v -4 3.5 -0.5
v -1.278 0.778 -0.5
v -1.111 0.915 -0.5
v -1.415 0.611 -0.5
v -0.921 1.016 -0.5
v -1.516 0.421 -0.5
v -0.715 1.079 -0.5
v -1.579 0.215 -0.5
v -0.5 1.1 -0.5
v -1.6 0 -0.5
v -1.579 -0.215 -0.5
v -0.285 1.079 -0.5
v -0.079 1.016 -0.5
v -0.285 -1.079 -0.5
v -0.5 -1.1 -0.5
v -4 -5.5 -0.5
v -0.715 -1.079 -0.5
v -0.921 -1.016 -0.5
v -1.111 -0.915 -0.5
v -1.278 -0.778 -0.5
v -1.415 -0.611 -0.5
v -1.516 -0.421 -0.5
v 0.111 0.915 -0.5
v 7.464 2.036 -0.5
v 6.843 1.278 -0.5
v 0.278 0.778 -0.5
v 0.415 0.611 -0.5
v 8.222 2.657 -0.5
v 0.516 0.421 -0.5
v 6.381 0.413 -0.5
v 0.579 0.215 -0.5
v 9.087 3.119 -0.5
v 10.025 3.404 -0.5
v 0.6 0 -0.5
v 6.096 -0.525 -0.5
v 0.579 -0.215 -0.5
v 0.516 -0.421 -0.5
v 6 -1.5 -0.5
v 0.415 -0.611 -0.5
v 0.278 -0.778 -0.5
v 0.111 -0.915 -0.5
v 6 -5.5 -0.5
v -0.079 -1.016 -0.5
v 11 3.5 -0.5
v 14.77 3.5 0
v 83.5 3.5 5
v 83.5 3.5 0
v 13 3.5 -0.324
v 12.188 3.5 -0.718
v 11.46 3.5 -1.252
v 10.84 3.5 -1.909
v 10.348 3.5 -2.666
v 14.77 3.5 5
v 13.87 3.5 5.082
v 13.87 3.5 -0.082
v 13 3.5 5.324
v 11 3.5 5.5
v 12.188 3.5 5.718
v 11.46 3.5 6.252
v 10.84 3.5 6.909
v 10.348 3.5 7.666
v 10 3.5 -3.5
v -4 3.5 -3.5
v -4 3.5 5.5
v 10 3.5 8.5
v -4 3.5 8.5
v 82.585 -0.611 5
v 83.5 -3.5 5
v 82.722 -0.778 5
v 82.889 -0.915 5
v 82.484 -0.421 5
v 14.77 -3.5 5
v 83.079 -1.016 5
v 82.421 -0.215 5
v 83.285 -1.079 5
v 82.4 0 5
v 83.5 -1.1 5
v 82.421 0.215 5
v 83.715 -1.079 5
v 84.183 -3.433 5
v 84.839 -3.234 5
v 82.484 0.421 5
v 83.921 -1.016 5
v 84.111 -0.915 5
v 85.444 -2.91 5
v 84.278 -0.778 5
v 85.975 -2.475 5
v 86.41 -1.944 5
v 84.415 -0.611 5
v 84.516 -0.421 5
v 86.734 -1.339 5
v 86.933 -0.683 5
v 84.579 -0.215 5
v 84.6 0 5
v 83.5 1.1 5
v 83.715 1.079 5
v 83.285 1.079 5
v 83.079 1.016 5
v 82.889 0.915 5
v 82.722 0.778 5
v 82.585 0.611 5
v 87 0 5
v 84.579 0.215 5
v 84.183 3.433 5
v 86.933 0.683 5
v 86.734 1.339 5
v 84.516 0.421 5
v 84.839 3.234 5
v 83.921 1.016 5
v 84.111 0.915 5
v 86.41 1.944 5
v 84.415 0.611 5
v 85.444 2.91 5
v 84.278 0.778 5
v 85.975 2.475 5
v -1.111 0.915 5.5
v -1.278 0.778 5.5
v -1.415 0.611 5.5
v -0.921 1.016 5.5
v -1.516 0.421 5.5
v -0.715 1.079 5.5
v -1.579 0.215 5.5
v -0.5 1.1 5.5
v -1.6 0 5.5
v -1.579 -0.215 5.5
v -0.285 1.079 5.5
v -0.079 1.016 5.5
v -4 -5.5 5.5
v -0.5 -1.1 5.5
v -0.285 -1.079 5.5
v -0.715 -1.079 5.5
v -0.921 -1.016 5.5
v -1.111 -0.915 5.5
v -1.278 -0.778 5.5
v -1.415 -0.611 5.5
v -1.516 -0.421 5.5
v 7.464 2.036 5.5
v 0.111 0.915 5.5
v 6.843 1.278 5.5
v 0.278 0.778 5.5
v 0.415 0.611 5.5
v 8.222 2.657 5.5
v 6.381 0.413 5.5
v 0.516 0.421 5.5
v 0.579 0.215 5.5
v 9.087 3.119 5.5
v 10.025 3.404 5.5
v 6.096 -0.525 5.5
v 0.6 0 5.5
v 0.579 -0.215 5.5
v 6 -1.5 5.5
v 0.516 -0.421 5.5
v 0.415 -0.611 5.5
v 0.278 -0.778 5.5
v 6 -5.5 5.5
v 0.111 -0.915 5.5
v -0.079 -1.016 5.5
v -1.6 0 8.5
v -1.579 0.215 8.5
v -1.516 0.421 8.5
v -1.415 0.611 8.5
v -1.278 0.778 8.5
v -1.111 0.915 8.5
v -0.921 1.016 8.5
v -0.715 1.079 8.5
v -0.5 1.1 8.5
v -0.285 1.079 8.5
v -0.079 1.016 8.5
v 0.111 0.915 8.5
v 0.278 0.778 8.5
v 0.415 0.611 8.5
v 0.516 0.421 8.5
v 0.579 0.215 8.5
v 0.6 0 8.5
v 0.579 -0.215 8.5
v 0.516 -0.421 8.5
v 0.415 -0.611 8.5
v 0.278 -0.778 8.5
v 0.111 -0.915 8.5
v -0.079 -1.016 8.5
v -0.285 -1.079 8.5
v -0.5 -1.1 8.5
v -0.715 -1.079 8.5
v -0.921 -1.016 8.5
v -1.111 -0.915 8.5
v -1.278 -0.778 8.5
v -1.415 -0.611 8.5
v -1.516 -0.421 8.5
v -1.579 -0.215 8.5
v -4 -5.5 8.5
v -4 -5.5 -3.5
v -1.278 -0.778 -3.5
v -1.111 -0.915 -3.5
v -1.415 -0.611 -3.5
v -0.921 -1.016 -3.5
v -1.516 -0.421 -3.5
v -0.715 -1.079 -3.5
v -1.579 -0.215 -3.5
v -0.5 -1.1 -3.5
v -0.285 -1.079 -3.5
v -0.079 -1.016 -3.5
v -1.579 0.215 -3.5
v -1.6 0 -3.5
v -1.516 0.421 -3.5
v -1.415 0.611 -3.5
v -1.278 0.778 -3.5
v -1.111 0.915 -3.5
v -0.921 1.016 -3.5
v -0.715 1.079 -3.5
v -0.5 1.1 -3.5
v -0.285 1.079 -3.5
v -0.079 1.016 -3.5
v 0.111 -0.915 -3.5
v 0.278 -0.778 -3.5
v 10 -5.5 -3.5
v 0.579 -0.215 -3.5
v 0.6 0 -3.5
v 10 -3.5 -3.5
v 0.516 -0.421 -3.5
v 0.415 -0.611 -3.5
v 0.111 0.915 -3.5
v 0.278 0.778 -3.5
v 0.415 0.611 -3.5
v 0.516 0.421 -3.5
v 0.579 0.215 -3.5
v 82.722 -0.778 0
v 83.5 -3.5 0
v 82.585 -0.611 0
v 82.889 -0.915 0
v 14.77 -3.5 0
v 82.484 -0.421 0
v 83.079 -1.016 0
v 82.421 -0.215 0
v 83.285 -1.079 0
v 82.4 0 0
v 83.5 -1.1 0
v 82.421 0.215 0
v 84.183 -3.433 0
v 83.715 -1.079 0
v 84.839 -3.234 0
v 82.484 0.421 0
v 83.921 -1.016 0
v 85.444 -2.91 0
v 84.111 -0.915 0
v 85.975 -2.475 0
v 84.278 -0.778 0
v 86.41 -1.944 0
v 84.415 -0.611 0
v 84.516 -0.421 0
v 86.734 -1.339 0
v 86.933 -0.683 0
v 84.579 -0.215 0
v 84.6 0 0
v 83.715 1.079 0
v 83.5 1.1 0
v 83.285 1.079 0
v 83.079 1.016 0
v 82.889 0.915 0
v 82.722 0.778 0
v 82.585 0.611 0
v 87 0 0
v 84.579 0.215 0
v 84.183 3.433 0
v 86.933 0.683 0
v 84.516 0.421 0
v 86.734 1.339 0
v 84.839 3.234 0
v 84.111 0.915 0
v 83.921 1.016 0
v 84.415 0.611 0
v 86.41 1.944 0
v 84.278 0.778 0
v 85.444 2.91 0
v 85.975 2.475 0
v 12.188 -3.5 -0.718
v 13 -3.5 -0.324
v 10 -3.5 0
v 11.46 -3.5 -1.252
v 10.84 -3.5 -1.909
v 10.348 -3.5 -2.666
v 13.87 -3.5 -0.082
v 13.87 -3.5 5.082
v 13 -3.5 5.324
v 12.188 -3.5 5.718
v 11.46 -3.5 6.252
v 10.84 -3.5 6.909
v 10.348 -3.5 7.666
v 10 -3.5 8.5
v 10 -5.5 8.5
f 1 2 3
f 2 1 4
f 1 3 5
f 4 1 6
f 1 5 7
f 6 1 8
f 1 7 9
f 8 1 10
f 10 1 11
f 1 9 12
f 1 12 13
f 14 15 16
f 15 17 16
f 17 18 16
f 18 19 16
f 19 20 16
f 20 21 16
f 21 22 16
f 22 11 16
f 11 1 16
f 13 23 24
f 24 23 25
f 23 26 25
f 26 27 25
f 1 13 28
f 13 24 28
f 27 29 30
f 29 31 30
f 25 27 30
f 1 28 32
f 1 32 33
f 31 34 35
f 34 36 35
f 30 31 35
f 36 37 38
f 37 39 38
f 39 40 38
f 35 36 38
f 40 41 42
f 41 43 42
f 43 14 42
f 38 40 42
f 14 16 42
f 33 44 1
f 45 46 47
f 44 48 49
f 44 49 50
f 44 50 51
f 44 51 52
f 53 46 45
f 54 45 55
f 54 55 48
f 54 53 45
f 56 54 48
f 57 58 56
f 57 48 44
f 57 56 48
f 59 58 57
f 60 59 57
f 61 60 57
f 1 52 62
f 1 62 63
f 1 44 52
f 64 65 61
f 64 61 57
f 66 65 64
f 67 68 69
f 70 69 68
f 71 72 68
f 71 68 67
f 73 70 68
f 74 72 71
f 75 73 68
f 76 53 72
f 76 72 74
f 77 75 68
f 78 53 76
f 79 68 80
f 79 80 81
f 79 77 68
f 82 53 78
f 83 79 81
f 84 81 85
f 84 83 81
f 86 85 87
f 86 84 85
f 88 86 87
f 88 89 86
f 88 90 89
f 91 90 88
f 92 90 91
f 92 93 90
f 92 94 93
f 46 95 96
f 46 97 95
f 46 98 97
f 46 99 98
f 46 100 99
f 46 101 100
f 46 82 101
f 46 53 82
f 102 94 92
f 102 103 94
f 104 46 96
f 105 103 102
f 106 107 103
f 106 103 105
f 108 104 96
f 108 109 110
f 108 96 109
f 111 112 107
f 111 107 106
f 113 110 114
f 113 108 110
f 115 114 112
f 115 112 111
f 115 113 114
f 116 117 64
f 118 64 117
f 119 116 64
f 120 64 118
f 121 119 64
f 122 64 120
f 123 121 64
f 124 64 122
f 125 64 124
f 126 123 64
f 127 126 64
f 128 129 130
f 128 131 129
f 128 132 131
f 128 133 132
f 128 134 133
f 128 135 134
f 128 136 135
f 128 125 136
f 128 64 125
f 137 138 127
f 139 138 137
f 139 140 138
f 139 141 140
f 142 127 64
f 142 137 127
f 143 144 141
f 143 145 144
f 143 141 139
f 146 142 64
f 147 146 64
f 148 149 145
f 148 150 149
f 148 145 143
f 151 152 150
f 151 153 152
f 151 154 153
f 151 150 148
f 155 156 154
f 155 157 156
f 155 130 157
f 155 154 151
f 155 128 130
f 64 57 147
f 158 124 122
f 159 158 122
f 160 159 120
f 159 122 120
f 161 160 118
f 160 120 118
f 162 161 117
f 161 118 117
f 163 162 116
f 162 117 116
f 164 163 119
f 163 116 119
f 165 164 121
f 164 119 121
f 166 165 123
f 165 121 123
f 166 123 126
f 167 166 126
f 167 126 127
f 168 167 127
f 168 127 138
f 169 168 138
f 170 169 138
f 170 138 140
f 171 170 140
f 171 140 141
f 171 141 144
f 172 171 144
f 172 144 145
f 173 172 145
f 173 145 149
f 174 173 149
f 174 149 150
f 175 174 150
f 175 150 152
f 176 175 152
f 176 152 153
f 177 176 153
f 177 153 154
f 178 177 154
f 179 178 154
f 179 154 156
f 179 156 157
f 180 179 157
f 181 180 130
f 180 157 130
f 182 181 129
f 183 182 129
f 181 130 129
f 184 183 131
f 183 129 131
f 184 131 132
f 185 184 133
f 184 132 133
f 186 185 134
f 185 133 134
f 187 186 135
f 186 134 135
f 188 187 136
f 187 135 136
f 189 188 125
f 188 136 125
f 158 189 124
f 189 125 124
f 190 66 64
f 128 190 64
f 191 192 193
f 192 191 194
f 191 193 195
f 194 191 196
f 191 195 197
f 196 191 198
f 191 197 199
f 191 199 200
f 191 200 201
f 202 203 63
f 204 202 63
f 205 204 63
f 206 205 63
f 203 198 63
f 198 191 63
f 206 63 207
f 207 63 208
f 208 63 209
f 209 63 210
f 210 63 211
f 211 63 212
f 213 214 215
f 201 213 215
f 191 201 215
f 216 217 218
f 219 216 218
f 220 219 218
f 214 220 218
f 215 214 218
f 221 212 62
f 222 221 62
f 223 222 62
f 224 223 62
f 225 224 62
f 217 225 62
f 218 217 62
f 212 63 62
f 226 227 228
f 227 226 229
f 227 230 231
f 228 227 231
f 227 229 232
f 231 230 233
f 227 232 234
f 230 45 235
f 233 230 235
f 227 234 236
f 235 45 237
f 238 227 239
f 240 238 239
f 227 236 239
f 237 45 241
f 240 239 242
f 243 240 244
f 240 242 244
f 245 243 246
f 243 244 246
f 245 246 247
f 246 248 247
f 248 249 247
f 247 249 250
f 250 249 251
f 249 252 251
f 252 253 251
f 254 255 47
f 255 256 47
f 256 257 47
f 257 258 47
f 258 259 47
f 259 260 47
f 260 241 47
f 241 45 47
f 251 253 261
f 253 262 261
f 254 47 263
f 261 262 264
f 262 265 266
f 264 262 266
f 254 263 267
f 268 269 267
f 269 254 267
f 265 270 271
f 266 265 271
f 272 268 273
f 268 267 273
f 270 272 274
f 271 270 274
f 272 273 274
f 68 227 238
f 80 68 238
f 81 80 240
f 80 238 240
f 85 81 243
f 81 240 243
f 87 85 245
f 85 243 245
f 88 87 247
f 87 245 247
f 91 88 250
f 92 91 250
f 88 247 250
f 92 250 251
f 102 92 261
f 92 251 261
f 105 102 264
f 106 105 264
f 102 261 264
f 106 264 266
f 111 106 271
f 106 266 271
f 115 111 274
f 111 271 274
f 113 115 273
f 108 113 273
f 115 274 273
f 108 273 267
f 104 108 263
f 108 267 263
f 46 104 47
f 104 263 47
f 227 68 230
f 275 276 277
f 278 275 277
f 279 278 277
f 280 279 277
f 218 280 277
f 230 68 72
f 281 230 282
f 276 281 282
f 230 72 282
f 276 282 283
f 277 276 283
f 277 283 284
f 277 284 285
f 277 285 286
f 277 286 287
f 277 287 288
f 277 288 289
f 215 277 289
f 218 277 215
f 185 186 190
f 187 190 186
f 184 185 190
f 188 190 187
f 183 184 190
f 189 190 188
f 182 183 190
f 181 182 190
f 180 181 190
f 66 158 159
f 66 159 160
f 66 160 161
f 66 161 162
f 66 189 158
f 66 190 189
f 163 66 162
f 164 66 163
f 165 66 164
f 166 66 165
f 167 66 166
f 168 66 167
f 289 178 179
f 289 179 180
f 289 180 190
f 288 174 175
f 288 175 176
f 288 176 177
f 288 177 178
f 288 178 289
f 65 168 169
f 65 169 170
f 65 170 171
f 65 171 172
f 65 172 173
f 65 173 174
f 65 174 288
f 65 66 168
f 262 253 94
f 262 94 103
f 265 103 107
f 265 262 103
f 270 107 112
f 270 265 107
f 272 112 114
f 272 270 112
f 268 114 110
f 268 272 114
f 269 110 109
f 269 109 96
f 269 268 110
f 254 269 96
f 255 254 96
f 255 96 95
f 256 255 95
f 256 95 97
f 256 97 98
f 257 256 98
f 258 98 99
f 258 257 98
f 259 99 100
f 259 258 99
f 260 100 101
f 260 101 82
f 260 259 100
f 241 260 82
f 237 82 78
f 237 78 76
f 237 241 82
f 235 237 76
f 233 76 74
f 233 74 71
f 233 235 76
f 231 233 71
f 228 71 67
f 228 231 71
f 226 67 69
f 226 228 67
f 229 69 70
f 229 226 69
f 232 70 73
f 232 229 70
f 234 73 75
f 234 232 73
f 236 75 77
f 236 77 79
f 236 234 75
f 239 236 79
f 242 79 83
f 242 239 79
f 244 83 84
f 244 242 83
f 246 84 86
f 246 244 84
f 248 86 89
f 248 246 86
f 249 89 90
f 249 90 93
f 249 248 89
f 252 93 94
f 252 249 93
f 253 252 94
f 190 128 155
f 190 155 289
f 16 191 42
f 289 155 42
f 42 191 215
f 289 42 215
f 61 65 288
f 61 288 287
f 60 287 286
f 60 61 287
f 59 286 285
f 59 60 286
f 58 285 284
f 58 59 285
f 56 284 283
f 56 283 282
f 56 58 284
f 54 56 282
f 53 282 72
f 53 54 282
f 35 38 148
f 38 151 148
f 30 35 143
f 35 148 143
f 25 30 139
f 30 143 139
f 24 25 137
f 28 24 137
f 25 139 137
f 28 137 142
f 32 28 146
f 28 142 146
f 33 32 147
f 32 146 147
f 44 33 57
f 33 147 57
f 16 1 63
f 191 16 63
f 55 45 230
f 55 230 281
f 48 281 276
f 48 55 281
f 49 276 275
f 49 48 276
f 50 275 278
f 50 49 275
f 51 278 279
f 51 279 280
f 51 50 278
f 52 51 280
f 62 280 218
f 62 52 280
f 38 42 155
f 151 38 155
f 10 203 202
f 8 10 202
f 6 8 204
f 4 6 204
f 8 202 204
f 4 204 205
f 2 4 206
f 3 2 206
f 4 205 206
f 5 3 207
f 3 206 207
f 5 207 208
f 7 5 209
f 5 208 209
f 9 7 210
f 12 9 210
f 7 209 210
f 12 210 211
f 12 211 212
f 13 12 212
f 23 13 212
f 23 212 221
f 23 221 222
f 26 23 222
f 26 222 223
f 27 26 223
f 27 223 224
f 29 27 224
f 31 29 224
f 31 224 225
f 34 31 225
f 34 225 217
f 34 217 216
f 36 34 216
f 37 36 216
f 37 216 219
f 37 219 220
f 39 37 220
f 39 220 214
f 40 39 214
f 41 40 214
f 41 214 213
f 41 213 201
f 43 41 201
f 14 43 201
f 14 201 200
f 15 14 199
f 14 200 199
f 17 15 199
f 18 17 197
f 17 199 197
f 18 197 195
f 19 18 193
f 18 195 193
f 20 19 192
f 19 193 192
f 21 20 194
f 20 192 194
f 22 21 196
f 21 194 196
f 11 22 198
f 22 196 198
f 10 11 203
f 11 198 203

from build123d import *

# Parameters (mm, degrees)
SKETCH1_R           = 1.1
BOSS_EXTRUDE1_DEPTH = 5
SKETCH4_W           = 14
SKETCH4_H           = 12
BOSS_EXTRUDE3_DEPTH = 9
SKETCH5_W           = 10
SKETCH5_H           = 6
CUT_EXTRUDE2_DEPTH  = 9
CUT_EXTRUDE3_START  = 5
SKETCH7_R           = 1.1
CUT_EXTRUDE3_DEPTH  = 15
FILLET1_R           = 5
FILLET2_R           = 5


with BuildPart() as part:
    # Sketch1 → Boss-Extrude1 (new body)
    with BuildSketch(Plane.XY):
        with BuildLine():
            ThreePointArc((0, 3.5), (-3.5, 0), (0, -3.5))
            Line((0, -3.5), (83.5, -3.5))
            ThreePointArc((83.5, -3.5), (87, 0), (83.5, 3.5))
            Line((83.5, 3.5), (0, 3.5))
        make_face()
        Circle(SKETCH1_R, mode=Mode.SUBTRACT)
        with Locations((83.5, 0)):
            Circle(SKETCH1_R, mode=Mode.SUBTRACT)
    extrude(amount=BOSS_EXTRUDE1_DEPTH)

    # Sketch4 → Boss-Extrude3 (add)
    with BuildSketch(Plane(origin=(0, 3.5, 0), x_dir=(1, 0, 0), z_dir=(0, 1, 0))):
        with Locations((3, -2.5)):
            Rectangle(SKETCH4_W, SKETCH4_H)
    extrude(amount=-BOSS_EXTRUDE3_DEPTH)

    # Sketch5 → Cut-Extrude2 (cut)
    with BuildSketch(Plane.XZ.offset(5.5)):
        with Locations((1, 2.5)):
            Rectangle(SKETCH5_W, SKETCH5_H)
    extrude(amount=-CUT_EXTRUDE2_DEPTH, mode=Mode.SUBTRACT)

    # Sketch7 → Cut-Extrude3 (cut)
    with BuildSketch(Plane(origin=(0, 0, 0), x_dir=(-1, 0, 0), z_dir=(0, 0, -1)).offset(CUT_EXTRUDE3_START)):
        with Locations((0.5, 0)):
            Circle(SKETCH7_R)
    extrude(amount=-CUT_EXTRUDE3_DEPTH, mode=Mode.SUBTRACT)

    # Fillet1
    # the kernel refuses this fillet: 5 mm, written as the material it adds along each edge
    with BuildSketch(Plane(origin=(10, 3.5, 5), x_dir=(0, 0, 1), z_dir=(0, -1, 0))) as fillet1_piece_1:
        with BuildLine():
            CenterArc((5, -4.769696007), FILLET1_R, 107.457603124, 72.542396876)
            Line((0, -4.769696007), (-0.1, -4.769696007))
            Line((-0.1, -4.769696007), (-0.1, 0))
            Line((-0.1, 0), (0, 0.1))
            ThreePointArc((0, 0.1), (1.75, 0.1), (3.47, 0.09539392))
            Line((3.47, 0.09539392), (3.5, 0))
        make_face()
    extrude(amount=7)
    with BuildSketch(Plane(origin=(10, 3.5, 0), x_dir=(1, 0, 0), z_dir=(0, -1, 0))) as fillet1_piece_2:
        with BuildLine():
            CenterArc((4.769696007, -5), FILLET1_R, 90, 72.542396876)
            Line((0, -3.5), (-0.09539392, -3.47))
            ThreePointArc((-0.09539392, -3.47), (-0.1, -1.75), (-0.1, 0))
            Line((-0.1, 0), (0, 0.1))
            Line((0, 0.1), (4.769696007, 0.1))
            Line((4.769696007, 0.1), (4.769696007, 0))
        make_face()
    extrude(amount=7)

    # Fillet2
    fillet2_edges = [part.edges().sort_by_distance(p)[0] for p in [
        (6, 3.5, 2.5),
    ]]
    fillet(fillet2_edges, radius=FILLET2_R)


solid = part.part
